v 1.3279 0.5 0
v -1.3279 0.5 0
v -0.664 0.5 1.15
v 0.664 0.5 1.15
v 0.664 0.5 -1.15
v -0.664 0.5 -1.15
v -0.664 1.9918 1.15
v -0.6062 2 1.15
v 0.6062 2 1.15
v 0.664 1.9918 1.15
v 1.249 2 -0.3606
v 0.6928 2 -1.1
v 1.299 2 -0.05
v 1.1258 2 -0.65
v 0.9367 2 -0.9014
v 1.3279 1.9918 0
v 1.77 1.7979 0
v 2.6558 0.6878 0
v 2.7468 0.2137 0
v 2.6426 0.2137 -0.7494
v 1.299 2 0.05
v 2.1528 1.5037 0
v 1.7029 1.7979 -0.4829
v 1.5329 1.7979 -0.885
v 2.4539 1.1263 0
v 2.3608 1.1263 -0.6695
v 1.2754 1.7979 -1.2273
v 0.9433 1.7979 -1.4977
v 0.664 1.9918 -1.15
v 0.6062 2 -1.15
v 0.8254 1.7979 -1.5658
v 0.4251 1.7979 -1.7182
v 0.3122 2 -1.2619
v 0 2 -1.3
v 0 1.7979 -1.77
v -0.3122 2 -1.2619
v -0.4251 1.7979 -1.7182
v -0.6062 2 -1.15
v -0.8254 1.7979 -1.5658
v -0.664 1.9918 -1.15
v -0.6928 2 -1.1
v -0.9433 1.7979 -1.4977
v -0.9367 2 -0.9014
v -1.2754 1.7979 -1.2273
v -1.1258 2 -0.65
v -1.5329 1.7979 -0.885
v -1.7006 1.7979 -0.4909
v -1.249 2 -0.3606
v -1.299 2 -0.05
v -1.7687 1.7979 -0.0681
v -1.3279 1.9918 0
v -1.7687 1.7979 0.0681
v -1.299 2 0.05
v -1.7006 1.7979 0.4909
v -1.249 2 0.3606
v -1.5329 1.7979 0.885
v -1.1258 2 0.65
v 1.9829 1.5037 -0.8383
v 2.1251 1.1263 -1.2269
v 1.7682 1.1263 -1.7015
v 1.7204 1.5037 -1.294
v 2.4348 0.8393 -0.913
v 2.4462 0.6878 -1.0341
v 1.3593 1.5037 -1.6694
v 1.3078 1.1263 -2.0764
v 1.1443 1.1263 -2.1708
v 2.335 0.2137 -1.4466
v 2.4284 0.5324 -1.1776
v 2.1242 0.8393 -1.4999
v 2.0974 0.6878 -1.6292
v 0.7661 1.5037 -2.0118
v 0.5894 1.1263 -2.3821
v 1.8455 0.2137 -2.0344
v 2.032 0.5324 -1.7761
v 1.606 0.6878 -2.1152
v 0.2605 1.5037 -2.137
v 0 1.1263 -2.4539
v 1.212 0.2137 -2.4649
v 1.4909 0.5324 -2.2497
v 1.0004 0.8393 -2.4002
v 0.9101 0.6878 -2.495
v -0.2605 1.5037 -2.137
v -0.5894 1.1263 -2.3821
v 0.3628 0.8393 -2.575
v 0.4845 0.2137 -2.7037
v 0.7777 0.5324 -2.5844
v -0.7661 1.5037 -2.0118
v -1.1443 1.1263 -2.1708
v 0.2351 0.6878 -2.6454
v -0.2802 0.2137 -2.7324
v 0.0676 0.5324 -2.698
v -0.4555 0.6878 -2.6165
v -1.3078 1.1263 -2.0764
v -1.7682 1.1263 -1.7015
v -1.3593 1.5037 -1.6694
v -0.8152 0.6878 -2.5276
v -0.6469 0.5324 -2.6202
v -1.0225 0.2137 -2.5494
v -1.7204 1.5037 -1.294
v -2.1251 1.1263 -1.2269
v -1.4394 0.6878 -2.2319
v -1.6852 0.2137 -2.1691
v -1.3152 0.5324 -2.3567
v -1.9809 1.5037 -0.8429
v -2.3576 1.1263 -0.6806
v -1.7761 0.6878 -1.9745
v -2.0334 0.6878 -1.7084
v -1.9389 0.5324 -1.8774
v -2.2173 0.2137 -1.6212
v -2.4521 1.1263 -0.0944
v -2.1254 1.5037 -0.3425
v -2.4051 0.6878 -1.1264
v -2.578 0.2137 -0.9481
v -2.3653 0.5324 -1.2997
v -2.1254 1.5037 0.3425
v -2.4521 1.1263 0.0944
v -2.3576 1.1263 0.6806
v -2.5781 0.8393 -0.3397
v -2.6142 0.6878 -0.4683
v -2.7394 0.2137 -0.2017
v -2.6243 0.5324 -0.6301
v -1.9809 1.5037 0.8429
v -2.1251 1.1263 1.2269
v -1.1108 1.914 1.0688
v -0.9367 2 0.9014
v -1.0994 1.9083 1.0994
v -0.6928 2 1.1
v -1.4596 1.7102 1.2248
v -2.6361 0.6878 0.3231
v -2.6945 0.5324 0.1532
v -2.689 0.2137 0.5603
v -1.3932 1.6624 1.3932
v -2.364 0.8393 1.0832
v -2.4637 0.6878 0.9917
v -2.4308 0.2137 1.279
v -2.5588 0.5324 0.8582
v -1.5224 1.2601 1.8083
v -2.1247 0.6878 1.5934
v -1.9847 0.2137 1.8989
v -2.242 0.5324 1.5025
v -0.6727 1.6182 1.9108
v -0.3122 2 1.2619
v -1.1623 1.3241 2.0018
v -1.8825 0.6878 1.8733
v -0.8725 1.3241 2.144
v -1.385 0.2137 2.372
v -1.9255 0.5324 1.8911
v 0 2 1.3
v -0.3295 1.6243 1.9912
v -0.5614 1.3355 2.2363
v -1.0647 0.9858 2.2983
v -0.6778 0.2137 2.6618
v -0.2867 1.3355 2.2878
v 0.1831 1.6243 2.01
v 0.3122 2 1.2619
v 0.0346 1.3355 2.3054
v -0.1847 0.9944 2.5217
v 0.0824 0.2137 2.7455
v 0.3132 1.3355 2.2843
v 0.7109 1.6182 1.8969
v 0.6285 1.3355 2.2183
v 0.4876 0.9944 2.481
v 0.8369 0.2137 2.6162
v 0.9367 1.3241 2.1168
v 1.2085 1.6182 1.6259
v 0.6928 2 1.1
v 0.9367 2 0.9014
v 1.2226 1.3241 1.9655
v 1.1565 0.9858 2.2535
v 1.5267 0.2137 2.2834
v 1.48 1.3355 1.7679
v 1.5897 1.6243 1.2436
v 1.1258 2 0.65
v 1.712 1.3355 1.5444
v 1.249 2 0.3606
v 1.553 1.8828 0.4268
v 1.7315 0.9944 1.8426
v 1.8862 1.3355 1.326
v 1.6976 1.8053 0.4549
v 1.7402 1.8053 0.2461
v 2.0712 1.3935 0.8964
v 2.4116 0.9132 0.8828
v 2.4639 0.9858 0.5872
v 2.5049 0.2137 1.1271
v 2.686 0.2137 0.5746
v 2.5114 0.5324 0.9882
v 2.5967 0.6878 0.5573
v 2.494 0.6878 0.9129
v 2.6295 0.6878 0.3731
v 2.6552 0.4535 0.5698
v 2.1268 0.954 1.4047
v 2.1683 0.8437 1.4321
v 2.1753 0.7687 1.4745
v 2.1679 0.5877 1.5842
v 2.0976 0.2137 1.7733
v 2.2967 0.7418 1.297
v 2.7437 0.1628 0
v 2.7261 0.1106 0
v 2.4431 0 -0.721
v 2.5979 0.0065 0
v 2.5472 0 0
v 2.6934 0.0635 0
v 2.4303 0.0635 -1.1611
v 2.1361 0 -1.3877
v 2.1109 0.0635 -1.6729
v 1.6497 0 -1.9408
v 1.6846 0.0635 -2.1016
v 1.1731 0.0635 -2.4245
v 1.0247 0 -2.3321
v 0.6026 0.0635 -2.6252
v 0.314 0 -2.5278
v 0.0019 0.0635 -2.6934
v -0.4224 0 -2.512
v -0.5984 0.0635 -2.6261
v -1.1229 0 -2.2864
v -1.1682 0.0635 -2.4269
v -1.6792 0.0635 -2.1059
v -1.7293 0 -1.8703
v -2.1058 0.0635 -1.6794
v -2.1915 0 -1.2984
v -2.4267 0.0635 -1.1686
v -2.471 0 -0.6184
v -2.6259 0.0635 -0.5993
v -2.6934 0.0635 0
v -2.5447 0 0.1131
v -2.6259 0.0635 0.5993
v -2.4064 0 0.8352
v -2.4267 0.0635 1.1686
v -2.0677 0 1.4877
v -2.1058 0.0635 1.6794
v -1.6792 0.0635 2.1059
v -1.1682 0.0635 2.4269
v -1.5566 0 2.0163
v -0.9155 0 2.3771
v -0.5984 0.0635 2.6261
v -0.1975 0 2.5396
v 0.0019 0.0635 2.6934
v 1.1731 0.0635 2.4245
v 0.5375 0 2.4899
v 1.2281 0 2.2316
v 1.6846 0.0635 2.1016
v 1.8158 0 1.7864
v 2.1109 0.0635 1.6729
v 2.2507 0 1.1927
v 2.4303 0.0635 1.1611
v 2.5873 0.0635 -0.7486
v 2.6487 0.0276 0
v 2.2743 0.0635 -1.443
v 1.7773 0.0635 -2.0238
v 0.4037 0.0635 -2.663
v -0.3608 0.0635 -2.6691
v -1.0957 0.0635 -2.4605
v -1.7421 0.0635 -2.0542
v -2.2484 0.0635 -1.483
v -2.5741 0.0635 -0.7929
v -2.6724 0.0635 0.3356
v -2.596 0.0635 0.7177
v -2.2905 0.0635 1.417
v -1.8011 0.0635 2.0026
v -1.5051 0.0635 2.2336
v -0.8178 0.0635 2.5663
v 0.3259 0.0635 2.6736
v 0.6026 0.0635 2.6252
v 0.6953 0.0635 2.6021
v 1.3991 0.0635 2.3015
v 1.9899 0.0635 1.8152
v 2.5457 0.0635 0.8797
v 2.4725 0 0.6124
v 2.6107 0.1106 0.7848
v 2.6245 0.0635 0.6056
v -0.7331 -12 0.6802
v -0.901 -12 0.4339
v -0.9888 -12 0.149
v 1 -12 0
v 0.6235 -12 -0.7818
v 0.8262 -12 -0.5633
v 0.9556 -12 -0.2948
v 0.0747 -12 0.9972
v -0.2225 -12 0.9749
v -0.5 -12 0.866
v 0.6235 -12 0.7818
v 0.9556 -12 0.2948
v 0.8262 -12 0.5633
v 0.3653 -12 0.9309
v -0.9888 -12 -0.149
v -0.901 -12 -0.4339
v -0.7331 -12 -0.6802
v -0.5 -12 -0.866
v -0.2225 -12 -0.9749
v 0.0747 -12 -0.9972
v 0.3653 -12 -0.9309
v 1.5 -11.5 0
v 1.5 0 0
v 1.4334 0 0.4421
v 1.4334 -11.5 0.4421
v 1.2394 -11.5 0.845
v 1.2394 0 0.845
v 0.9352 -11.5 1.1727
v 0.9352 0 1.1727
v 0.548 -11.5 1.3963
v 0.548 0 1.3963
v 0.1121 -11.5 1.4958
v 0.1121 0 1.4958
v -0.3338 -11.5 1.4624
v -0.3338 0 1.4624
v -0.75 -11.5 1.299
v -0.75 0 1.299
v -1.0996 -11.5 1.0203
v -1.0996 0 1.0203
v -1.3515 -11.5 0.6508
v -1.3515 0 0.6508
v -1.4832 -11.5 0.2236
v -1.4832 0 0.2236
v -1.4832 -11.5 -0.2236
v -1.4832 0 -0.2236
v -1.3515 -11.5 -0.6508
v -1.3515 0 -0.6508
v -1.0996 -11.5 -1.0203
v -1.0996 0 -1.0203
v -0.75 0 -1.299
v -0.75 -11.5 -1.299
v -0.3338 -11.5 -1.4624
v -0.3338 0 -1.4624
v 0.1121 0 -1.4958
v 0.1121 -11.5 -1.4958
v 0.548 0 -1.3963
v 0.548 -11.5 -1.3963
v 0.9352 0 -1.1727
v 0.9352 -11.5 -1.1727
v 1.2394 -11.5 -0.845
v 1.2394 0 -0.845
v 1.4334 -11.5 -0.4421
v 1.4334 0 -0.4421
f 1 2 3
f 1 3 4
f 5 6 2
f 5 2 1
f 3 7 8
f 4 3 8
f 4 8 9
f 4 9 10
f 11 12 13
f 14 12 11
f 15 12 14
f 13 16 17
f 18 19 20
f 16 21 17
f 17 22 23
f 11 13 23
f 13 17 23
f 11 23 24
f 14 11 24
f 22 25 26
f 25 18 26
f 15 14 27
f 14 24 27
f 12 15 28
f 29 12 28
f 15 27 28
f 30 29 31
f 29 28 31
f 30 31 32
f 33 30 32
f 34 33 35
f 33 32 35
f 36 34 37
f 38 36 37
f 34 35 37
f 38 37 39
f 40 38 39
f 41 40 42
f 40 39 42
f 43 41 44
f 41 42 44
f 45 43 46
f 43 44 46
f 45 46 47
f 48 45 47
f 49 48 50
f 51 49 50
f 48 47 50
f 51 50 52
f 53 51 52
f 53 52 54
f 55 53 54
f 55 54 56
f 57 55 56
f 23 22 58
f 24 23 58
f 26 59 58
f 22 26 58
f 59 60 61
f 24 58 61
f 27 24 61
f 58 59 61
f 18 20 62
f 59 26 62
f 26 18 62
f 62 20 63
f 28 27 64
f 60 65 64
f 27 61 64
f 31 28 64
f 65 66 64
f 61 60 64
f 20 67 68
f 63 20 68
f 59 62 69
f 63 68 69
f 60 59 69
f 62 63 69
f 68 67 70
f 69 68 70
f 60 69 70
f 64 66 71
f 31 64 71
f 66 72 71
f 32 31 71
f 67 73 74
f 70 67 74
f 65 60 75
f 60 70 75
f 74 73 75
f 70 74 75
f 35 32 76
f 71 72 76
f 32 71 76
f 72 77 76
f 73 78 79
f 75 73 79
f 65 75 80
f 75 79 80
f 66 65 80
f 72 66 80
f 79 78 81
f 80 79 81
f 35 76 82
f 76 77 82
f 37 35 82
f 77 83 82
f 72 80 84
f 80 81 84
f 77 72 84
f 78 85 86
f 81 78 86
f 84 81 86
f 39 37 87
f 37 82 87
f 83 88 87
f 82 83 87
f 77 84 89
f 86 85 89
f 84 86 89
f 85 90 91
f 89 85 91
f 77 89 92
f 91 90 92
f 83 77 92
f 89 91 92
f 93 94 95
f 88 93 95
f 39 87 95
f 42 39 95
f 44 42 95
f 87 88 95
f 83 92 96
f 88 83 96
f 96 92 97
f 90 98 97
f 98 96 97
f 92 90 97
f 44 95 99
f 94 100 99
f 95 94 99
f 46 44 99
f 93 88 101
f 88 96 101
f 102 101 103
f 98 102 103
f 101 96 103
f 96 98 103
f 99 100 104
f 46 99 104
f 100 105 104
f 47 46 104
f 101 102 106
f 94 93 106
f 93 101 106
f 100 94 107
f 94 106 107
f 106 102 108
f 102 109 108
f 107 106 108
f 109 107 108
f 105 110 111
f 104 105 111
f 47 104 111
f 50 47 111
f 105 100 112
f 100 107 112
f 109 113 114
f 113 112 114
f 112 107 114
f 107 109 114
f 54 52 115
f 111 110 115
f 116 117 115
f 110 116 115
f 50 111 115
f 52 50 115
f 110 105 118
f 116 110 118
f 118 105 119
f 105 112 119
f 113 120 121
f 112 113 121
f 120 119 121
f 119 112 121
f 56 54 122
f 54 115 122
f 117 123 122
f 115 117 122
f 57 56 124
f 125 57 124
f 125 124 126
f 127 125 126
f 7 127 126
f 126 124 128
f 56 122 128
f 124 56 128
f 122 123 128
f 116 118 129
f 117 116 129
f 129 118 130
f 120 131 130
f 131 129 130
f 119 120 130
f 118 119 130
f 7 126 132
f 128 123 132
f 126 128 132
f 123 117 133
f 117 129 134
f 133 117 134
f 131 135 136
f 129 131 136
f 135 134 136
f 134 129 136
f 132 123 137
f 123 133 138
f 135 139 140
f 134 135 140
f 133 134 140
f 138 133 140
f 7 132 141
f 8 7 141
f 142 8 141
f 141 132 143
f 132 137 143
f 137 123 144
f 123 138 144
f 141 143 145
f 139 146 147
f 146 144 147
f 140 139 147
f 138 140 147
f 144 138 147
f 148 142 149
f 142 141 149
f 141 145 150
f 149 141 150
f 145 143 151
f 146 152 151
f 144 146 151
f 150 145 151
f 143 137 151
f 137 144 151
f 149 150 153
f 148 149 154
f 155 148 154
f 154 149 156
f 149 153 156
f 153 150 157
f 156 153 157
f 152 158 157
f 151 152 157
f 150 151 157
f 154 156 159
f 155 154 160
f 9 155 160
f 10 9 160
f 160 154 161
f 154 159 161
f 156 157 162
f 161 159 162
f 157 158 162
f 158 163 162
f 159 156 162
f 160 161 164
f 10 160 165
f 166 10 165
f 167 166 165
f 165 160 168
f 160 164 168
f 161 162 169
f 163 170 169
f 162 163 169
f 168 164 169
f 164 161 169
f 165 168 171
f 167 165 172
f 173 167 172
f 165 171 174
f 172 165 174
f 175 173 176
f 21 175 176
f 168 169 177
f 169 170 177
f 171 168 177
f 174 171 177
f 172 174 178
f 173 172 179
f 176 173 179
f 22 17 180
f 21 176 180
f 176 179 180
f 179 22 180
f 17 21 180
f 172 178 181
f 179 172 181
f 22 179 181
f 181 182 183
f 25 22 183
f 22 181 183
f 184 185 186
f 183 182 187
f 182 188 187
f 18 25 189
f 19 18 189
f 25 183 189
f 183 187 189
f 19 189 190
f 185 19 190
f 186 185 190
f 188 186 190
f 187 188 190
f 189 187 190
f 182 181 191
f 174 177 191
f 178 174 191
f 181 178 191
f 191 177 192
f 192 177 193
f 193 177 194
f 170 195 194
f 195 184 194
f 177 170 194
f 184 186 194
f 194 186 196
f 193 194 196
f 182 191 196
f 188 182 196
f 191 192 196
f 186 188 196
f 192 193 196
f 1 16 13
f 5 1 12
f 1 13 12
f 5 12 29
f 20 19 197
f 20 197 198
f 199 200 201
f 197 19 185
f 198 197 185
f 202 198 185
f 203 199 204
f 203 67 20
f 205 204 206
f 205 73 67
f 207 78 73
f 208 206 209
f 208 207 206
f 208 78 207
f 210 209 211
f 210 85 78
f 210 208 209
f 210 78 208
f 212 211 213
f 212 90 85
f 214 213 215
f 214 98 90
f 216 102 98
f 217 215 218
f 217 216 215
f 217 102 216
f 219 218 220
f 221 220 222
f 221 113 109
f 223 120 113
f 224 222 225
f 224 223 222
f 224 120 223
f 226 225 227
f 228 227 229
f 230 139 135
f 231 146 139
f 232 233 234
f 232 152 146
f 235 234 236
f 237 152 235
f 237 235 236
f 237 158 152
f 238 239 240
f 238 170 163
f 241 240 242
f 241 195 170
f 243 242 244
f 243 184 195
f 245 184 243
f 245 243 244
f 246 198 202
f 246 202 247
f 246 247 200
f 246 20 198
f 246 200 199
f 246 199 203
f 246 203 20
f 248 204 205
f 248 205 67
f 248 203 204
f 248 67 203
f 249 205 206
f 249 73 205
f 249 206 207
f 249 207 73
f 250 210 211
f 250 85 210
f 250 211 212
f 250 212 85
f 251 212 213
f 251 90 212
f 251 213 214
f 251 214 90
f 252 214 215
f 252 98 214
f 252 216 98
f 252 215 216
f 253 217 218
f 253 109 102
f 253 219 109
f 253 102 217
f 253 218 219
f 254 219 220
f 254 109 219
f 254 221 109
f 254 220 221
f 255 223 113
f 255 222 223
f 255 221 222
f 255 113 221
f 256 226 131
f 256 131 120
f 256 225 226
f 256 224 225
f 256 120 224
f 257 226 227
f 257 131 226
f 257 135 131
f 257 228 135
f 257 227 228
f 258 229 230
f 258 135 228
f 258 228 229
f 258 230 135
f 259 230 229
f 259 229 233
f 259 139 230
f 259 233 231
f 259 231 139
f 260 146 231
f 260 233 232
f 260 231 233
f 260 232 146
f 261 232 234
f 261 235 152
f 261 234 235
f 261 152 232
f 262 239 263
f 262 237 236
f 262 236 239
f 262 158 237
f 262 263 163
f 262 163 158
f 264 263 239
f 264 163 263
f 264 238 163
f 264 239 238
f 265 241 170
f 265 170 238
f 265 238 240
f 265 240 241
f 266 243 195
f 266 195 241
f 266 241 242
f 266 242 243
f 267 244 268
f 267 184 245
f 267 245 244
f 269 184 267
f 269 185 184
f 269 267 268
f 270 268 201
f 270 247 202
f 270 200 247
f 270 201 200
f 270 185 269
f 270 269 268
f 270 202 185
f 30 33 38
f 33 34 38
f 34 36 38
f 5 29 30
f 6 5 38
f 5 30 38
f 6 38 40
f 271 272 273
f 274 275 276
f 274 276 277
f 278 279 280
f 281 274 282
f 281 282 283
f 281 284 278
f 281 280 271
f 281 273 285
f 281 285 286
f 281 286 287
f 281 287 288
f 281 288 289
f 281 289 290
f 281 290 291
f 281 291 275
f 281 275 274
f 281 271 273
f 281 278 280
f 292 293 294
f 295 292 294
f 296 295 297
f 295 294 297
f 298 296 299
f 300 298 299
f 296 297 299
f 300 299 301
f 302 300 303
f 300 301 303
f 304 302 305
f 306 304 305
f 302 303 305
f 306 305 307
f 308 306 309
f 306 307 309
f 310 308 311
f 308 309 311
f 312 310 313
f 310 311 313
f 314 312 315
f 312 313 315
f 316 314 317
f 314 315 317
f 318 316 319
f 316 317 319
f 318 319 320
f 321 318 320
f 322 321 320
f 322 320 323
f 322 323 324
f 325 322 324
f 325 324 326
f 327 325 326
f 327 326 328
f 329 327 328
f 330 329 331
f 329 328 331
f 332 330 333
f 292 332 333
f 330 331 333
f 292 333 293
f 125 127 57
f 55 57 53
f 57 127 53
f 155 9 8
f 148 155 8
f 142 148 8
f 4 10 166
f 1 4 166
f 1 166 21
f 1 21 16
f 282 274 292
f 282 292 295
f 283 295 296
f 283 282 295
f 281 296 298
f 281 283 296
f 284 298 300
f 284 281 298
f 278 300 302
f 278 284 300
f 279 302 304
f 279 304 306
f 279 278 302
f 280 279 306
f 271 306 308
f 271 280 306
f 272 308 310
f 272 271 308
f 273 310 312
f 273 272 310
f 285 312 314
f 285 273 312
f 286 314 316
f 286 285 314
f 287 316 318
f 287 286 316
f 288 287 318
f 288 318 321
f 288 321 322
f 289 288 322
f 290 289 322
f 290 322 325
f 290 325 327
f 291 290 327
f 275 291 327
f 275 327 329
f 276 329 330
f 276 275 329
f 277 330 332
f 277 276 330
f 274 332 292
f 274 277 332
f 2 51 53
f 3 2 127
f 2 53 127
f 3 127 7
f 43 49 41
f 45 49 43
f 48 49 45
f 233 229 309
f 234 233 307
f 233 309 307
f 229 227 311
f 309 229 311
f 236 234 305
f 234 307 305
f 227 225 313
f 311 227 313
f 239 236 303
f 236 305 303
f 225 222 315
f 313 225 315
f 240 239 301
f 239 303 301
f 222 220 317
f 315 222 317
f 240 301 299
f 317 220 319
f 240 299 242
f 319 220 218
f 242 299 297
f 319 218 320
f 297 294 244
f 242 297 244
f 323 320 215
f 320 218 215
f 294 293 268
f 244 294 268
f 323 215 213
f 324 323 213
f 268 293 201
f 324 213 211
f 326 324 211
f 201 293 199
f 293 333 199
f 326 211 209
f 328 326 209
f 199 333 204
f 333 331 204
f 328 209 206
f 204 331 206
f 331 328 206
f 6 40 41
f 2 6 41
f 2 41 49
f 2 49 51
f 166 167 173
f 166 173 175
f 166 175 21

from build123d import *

# Parameters (mm, degrees)
FILLET_1_R          = 0.2
CUT_EXTRUDE_1_DEPTH = 1.5
SKETCH_3_R          = 1.5
EXTRUDE_1_DEPTH     = 12
CHAMFER_1_SIZE      = 0.5


with BuildPart() as part:
    # 草图1 → 旋转1 (revolve)
    with BuildSketch(Plane.XY):
        with BuildLine():
            Line((0, 0), (0, 2))
            Line((0, 2), (1.3, 2))
            ThreePointArc((1.3, 2), (2.370691821, 1.250626571), (2.75, 0))
            Line((2.75, 0), (0, 0))
        make_face()
    revolve(axis=Axis((0, 0, 0), (0, 1, 0)))

    # 圆角1
    fillet_1_edges = [part.edges().sort_by_distance(p)[0] for p in [
        (-2.75, 0, 0),
    ]]
    fillet(fillet_1_edges, radius=FILLET_1_R)

    # 草图2 → 切除-拉伸1 (cut)
    with BuildSketch(Plane(origin=(0, 2, 0), x_dir=(1, 0, 0), z_dir=(0, 1, 0))):
        Polygon((1.327905619, 0), (0.66395281, 1.15), (-0.66395281, 1.15), (-1.327905619, 0), (-0.66395281, -1.15), (0.66395281, -1.15), align=None)
    extrude(amount=-CUT_EXTRUDE_1_DEPTH, mode=Mode.SUBTRACT)

    # 草图3 → 凸台-拉伸1 (add)
    with BuildSketch(Plane.XZ):
        Circle(SKETCH_3_R)
    extrude(amount=EXTRUDE_1_DEPTH)

    # 倒角1
    chamfer_1_edges = [part.edges().sort_by_distance(p)[0] for p in [
        (-1.5, -12, 0),
    ]]
    chamfer(chamfer_1_edges, length=CHAMFER_1_SIZE)


solid = part.part
